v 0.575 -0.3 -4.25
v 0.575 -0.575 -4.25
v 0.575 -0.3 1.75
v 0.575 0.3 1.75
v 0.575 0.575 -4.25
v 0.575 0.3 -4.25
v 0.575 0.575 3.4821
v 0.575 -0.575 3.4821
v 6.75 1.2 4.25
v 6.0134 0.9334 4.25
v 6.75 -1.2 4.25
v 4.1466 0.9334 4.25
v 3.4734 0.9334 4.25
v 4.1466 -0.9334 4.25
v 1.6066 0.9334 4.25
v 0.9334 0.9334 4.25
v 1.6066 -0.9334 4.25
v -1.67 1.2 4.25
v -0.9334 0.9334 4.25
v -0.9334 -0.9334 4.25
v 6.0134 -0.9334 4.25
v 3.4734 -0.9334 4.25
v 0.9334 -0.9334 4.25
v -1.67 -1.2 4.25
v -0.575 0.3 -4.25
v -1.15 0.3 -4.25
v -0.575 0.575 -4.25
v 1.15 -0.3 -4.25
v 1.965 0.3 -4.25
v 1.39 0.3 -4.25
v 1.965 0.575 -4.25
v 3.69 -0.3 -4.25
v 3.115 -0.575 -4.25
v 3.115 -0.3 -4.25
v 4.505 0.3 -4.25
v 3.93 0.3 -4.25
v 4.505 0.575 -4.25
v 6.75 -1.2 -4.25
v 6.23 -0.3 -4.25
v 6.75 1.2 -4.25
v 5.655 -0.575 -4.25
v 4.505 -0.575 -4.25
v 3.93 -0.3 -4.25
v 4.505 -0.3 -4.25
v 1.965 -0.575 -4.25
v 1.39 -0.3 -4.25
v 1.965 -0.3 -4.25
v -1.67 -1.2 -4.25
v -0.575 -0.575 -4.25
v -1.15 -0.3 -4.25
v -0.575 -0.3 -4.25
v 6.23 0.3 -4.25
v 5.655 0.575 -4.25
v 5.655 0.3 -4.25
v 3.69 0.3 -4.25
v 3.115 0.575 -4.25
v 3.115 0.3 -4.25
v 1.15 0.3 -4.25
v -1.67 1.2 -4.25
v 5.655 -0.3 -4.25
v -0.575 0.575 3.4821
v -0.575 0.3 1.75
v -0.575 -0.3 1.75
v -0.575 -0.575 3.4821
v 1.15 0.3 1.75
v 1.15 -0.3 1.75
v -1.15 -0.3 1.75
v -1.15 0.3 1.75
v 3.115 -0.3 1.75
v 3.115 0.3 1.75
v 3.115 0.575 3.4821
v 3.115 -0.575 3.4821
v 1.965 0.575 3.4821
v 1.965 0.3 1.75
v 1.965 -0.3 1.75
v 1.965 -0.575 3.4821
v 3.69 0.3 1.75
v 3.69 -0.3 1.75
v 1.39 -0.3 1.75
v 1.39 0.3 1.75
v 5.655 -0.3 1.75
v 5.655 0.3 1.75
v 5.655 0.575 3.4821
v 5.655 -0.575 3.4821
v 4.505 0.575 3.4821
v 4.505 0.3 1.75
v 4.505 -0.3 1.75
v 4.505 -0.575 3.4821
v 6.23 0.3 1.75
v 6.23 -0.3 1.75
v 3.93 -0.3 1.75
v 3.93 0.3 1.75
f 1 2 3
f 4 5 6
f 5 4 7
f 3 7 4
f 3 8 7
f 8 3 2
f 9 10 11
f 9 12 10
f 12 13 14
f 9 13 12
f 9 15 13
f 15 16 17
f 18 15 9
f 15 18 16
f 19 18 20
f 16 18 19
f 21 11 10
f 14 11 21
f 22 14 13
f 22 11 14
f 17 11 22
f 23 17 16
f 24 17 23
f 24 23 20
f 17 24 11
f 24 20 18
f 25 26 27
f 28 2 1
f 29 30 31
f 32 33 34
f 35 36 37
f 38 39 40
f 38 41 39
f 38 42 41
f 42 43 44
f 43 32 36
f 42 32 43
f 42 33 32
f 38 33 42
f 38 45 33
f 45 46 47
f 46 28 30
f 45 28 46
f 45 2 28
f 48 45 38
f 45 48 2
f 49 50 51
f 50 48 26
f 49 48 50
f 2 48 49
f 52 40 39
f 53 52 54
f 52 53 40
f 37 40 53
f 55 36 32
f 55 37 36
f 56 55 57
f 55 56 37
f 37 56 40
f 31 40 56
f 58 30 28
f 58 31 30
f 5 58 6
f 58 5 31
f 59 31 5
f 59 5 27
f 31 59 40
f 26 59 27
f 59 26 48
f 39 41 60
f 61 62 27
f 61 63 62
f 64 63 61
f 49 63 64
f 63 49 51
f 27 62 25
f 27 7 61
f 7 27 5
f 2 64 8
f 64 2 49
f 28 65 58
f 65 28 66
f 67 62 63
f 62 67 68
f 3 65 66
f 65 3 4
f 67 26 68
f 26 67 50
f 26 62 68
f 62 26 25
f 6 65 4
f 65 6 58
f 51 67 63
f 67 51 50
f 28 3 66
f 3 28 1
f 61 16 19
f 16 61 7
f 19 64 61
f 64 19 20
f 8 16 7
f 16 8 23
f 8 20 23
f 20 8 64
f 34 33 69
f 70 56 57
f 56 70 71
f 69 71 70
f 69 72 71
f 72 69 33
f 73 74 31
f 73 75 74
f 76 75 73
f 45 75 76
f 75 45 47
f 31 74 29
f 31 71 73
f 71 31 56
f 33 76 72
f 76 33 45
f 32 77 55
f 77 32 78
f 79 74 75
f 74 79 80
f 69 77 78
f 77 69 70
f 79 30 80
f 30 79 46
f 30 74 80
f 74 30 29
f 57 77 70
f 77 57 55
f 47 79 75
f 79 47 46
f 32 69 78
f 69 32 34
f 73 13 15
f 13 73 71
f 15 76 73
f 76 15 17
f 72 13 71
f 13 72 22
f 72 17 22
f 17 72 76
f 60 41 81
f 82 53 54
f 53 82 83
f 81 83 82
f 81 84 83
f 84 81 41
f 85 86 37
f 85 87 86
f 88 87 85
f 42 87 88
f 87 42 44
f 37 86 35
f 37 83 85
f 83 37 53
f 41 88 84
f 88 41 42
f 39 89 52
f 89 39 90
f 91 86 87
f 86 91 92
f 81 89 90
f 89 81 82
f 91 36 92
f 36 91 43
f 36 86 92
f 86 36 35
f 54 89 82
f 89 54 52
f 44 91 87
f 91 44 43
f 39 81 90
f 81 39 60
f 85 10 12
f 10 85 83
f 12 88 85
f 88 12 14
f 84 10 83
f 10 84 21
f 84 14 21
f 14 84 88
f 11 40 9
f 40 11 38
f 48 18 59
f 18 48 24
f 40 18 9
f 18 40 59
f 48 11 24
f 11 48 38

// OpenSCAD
/*[Main Settings]*/

//The number of pins you need for your connector
num_pins =3;
//extra material on eith end of the connector in addition to the usual material between each pin
extra_ends=0.4;

/*[fine tuning]*/
//overall thickness of the connectors
thickness =2.4;
//Total height of the connectors
height=8.5;
//side length of the hole for the male pin
pin_width=1.15;
//thickness of the slot for the female connector
slot_thickness=0.6;
//height of the slot for the female connector
slot_height=6;
//width of the slot for the female connector
slot_width=2.3;
//distance between each pin. Note this is only designed for 2.54mm (0.1 inch) spaced pins so different sizes will probably not work
offset=2.54;
//increasing this increases the depth of the champfer where the male pins are pushed in
champfer=2;



w=offset*num_pins+extra_ends*2;


difference(){
    translate([w/2-offset/2-extra_ends,0,0])cube([w,thickness,height],true);//the main body
    for(i=[0:num_pins-1])//loops to insert each hole and geometry for each pin
    {
        translate([offset*i,0,0])hole();
	
    }
}




module hole()//does all the internal geometry for one pin
{
    union()
    {
        cube([pin_width,pin_width,height], true);//pin hole
        translate([0,0,-(height-slot_height)/2])	cube([slot_width,slot_thickness,    slot_height], true);//slot for female connector
        translate ([0,0,(height/2)-champfer])rotate([0,0,45])cylinder(h=champfer, r1=0, r2=thickness*0.55, $fn=4);//champfer 
	}
}
